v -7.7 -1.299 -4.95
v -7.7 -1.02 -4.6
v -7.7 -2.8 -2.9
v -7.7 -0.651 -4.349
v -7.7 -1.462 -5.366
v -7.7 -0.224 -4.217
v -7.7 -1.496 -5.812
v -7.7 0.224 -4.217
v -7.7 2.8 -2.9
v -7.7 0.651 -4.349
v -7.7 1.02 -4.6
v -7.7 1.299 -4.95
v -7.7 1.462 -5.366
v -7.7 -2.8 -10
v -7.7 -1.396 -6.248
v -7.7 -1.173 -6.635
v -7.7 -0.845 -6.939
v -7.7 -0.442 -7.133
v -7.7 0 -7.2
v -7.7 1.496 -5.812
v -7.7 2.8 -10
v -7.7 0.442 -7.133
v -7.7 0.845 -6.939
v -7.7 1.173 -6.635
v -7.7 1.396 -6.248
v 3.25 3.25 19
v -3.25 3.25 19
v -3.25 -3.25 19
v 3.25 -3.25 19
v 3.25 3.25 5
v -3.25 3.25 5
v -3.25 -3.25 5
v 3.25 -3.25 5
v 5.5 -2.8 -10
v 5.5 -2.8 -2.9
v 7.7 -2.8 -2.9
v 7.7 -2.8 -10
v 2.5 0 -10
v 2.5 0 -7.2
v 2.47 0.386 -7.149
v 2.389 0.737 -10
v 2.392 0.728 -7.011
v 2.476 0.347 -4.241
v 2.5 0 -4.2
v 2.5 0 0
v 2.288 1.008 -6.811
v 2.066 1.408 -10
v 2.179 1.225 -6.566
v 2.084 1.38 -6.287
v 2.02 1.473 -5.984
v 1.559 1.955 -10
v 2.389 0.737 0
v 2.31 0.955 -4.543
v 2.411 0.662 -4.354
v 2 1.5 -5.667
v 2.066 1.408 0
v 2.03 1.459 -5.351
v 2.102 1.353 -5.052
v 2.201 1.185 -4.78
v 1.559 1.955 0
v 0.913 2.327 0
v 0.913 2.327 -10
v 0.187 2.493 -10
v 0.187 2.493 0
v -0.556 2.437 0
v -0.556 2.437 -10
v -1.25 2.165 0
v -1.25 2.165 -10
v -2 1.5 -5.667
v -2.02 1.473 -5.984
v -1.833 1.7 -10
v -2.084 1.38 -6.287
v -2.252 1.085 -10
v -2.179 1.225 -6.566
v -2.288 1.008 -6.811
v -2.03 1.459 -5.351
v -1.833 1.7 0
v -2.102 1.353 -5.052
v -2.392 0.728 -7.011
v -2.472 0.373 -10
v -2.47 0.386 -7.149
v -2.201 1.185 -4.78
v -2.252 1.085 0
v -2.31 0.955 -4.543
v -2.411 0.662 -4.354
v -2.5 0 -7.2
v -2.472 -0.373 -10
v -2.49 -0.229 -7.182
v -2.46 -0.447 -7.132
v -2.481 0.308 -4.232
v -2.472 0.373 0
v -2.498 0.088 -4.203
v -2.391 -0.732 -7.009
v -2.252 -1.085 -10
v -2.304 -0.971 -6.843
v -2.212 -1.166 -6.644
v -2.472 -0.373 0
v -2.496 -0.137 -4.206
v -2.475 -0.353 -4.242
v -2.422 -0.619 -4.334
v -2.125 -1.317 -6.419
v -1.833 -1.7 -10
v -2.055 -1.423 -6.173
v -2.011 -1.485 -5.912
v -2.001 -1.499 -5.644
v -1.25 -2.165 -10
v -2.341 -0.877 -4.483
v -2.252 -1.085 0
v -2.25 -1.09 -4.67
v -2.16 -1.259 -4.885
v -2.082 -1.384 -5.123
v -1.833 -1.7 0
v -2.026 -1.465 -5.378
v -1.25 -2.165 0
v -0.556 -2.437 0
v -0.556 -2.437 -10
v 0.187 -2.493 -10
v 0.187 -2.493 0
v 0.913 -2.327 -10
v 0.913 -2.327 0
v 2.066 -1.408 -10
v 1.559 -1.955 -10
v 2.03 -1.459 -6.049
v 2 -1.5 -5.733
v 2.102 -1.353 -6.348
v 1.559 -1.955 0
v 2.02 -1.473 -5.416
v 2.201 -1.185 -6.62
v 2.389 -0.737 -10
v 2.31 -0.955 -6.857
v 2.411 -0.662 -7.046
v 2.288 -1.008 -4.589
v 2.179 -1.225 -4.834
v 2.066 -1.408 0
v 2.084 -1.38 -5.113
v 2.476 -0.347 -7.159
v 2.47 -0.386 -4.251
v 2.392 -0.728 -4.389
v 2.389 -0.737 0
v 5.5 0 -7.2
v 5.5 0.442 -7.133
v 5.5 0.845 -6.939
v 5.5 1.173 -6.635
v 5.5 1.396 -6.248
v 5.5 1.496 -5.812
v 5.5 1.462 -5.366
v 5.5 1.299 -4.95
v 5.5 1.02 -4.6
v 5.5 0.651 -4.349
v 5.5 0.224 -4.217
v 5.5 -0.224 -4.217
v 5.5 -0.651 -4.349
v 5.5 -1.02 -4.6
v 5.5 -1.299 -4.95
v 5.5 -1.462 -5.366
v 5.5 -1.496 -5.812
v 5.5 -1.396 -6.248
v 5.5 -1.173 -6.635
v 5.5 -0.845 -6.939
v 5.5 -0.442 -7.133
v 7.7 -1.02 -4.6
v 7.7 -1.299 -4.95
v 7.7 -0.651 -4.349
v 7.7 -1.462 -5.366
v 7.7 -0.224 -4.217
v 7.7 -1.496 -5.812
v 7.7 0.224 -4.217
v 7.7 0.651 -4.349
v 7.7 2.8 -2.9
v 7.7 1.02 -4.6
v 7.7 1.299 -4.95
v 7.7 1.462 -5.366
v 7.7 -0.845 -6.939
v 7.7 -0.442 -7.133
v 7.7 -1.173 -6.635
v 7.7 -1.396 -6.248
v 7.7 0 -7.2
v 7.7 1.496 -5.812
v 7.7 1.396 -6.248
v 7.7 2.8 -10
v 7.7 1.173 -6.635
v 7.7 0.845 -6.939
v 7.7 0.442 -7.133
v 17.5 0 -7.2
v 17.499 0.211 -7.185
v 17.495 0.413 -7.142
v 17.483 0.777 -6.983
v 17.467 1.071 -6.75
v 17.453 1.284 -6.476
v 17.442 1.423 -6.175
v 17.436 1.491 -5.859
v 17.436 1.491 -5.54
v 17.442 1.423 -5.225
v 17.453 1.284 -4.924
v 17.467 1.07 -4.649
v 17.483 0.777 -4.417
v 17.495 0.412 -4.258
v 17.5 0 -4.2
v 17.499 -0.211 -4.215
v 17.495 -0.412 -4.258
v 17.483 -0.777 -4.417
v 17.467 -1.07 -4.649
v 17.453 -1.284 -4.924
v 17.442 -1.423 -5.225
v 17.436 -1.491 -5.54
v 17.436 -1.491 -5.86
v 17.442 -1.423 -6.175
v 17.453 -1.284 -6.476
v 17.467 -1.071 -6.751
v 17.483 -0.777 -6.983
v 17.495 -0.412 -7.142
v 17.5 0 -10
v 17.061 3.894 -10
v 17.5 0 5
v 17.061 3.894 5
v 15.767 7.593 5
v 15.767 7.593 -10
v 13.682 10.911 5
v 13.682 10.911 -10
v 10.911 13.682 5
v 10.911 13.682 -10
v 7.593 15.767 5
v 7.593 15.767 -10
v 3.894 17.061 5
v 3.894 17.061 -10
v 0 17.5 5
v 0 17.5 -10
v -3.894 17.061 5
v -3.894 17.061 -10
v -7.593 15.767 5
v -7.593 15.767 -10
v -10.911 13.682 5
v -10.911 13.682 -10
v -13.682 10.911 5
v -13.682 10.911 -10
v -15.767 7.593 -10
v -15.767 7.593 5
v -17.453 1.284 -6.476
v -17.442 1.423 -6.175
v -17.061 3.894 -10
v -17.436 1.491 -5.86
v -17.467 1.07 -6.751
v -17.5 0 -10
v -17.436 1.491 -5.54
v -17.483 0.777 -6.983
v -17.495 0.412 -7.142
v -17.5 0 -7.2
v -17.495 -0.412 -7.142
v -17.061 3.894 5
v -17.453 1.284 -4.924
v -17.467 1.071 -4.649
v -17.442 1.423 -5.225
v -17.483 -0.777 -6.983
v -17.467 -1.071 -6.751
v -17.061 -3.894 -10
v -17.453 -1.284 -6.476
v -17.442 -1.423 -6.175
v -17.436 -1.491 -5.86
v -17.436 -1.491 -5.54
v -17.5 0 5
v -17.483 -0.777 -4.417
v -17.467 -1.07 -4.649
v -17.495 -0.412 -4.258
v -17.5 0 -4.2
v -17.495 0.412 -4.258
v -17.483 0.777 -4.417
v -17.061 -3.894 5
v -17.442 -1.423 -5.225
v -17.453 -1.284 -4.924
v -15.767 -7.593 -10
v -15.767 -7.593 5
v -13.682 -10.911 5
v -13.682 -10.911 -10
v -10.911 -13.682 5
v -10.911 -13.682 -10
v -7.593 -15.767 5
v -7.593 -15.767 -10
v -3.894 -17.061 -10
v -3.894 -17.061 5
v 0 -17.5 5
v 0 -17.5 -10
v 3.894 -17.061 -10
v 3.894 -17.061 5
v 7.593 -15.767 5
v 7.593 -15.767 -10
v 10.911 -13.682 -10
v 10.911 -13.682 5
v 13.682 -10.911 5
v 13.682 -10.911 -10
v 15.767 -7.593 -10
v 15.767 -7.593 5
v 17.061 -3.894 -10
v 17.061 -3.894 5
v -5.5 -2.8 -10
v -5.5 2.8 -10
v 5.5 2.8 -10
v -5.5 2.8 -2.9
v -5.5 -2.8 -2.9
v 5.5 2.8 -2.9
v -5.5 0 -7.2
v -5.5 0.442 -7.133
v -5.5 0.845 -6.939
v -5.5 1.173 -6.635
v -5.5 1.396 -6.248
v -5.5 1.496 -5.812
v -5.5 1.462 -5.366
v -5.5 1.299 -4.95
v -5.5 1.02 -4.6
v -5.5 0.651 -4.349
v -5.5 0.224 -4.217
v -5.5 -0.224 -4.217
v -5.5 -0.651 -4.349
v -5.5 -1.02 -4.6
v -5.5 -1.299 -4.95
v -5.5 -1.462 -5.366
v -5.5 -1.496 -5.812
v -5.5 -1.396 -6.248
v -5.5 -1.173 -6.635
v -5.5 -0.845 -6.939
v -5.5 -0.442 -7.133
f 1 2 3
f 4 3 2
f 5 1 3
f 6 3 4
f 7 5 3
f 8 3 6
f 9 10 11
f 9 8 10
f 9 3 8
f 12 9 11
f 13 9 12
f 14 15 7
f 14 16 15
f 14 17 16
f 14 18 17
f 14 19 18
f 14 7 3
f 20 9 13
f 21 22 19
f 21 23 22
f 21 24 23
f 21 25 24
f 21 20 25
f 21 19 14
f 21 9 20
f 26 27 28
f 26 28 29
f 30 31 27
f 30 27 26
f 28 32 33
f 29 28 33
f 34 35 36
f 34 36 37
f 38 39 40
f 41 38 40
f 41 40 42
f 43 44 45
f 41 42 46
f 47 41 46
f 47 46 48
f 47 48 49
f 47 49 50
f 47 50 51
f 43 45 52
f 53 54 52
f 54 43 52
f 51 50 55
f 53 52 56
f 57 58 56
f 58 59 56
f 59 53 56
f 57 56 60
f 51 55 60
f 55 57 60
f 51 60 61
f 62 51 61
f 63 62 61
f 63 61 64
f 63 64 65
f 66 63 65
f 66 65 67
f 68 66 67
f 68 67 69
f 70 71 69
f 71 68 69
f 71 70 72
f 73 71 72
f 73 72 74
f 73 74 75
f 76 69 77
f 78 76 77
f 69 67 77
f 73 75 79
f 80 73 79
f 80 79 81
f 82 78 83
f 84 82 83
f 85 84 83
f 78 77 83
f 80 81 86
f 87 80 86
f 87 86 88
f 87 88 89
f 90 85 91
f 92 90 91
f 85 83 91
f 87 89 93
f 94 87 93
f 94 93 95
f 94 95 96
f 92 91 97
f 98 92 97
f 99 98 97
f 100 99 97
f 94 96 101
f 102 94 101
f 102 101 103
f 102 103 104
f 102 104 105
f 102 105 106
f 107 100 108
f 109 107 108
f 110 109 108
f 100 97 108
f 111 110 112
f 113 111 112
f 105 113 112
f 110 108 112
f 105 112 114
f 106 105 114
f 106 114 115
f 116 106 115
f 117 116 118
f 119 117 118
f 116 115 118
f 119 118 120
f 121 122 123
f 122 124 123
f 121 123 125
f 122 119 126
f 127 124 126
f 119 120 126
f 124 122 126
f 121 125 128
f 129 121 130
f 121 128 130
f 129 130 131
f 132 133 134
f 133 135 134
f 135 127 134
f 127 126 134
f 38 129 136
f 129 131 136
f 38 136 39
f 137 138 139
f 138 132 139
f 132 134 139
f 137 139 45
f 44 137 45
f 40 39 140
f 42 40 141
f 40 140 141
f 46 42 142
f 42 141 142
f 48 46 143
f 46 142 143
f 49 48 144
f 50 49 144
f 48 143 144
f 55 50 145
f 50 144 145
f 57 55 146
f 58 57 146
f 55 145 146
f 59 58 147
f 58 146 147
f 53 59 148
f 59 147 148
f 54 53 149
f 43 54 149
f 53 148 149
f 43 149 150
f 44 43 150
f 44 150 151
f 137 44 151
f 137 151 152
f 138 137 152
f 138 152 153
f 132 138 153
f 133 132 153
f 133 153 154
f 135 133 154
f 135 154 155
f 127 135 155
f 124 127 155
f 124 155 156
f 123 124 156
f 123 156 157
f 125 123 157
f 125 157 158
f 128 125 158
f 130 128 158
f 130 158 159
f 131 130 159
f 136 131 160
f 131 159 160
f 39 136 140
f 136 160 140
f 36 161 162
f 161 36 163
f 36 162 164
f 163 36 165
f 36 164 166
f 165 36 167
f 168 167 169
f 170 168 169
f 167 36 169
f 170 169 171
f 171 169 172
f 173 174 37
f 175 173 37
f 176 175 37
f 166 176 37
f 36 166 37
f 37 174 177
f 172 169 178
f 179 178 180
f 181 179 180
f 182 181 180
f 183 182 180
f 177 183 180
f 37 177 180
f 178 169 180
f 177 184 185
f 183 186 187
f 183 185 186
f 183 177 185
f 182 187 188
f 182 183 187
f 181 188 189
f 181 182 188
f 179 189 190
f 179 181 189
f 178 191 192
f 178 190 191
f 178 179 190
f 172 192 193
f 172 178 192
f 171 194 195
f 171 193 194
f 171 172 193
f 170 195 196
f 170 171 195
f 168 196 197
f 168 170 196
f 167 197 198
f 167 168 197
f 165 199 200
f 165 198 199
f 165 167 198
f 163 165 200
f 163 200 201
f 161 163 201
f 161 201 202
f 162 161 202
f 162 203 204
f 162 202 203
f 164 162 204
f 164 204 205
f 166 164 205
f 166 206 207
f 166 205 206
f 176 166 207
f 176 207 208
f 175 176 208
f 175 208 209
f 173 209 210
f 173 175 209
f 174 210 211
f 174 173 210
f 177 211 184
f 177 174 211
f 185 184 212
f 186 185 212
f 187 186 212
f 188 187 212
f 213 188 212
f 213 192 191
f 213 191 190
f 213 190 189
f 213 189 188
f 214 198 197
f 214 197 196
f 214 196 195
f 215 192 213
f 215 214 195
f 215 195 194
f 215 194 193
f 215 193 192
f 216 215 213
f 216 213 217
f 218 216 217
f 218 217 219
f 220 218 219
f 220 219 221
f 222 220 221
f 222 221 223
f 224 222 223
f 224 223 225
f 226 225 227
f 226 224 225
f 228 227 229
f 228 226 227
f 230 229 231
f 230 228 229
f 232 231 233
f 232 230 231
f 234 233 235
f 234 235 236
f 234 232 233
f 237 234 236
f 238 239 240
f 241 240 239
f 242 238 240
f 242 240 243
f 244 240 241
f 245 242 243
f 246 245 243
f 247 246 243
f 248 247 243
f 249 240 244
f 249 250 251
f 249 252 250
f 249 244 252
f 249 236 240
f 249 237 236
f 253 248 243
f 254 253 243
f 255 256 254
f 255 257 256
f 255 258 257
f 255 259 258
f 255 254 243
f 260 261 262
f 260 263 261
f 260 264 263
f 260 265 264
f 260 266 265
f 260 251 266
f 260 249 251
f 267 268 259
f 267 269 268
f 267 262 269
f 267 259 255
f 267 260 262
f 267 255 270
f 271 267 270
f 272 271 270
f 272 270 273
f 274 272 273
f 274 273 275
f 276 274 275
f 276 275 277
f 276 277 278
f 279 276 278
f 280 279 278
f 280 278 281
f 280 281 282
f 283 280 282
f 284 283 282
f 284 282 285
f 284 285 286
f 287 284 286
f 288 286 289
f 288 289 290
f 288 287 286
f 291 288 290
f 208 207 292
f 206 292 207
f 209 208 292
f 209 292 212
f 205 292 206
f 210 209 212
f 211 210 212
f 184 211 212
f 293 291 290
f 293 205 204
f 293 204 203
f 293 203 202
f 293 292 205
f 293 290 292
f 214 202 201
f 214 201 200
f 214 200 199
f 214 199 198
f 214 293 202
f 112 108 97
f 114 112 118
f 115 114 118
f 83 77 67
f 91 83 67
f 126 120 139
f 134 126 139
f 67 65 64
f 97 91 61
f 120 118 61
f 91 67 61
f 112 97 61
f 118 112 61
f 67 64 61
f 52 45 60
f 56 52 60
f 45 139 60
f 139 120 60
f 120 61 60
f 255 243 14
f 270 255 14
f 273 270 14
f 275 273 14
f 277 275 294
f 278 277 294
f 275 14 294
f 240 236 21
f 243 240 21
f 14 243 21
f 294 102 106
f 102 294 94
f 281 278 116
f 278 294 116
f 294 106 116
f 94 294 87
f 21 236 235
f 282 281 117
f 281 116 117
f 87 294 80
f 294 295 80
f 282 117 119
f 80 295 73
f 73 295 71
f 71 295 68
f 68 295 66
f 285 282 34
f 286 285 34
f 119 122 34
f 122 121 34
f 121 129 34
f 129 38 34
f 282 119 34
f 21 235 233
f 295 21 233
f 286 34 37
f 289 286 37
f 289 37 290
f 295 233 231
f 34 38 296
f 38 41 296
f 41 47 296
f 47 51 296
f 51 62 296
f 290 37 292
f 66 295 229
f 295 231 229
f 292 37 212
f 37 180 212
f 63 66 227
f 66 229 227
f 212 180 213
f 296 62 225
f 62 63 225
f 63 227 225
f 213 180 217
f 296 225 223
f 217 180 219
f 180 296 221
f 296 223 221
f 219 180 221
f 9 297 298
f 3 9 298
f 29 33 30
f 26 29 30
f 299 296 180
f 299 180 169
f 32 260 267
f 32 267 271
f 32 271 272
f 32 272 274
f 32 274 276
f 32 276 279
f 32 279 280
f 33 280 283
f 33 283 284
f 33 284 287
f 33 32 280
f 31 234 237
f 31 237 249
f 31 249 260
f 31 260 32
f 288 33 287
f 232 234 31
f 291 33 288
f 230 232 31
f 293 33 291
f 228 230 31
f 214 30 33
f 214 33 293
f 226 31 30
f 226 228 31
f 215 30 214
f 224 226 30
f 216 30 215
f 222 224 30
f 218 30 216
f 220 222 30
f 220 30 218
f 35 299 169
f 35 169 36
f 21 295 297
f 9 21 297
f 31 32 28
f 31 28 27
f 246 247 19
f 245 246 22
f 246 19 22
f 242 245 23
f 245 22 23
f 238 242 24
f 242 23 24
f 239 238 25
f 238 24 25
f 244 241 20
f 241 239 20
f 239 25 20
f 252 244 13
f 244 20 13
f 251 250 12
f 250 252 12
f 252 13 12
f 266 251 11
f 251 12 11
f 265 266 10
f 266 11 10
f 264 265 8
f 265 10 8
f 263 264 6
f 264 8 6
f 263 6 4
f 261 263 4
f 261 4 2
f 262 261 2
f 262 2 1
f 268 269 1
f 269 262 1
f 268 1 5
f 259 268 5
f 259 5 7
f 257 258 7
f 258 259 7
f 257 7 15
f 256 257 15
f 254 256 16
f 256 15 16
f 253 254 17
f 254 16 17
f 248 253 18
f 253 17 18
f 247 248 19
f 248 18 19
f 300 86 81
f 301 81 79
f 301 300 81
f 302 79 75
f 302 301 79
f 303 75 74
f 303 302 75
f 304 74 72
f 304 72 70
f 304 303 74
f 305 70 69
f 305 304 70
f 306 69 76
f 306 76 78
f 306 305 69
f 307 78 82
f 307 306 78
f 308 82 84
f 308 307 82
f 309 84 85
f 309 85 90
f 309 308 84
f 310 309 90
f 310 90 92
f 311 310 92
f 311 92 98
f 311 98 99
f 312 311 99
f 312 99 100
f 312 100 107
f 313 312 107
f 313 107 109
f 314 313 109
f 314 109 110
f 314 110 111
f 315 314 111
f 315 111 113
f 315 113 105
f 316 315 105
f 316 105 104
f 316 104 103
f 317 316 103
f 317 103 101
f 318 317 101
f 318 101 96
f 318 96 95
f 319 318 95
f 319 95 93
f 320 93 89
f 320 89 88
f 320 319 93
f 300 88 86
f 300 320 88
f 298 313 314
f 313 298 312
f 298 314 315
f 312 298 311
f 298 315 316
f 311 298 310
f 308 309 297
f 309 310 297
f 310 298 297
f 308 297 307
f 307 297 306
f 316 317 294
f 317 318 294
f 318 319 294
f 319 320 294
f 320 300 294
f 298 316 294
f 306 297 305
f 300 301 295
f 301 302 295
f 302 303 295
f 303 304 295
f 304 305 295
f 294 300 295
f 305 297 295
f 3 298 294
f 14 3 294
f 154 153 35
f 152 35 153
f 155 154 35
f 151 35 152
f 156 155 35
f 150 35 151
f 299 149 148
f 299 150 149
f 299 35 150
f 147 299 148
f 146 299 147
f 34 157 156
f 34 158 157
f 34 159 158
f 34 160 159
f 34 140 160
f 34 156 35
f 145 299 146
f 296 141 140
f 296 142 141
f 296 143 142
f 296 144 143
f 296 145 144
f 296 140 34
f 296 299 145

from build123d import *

# Parameters (mm, degrees)
SKETCH1_R                           = 17.5
SKETCH1_R_2                         = 2.5
BOSS_EXTRUDE1_DEPTH                 = 10
BOSS_EXTRUDE2_START                 = 5
SKETCH1_3_R                         = 17.5
BOSS_EXTRUDE2_DEPTH                 = 5
CUT_EXTRUDE1_REACH                  = 32.582
CUT_EXTRUDE1_END_RADIUS             = 17.5
SKETCH8_R                           = 1.5
CUT_EXTRUDE1_DIRECTION_2_REACH      = 32.582
CUT_EXTRUDE1_DIRECTION_2_END_RADIUS = 2.5
CUT_EXTRUDE2_DEPTH                  = 2.2
SKETCH10_W                          = 6.5
SKETCH10_H                          = 6.5
BOSS_EXTRUDE3_DEPTH                 = 14


with BuildPart() as part:
    # Sketch1 → Boss-Extrude1 (new body)
    with BuildSketch(Plane.XY):
        Circle(SKETCH1_R)
        Circle(SKETCH1_R_2, mode=Mode.SUBTRACT)
    extrude(amount=-BOSS_EXTRUDE1_DEPTH)

    # Sketch1<3> → Boss-Extrude2 (add)
    with BuildSketch(Plane.XY.offset(BOSS_EXTRUDE2_START)):
        Circle(SKETCH1_3_R)
    extrude(amount=-BOSS_EXTRUDE2_DEPTH)

    # Cut-Extrude1: up to this cylinder (the profile starts inside it)
    cut_extrude1_end = Plane(origin=(0, 0, -5.7), z_dir=(0, 0, 1)) * Cylinder(CUT_EXTRUDE1_END_RADIUS, 101.164, mode=Mode.PRIVATE)
    # Sketch8 → Cut-Extrude1 (cut, up to the surface)
    with BuildSketch(Plane(origin=(5.5, 0, 0), x_dir=(0, 0, -1), z_dir=(1, 0, 0)), mode=Mode.PRIVATE) as cut_extrude1_sk1:
        with Locations((5.7, 0)):
            Circle(SKETCH8_R)
    cut_extrude1_tool1 = extrude(cut_extrude1_sk1.sketch, amount=CUT_EXTRUDE1_REACH, mode=Mode.PRIVATE) & cut_extrude1_end
    cut_extrude1 = cut_extrude1_tool1.solids().sort_by_distance((5.5, 0, -5.7))[0]
    add(cut_extrude1, mode=Mode.SUBTRACT)

    # Cut-Extrude1 direction 2: up to this cylinder (the profile starts outside it)
    cut_extrude1_direction_2_end = Plane(origin=(0, 0, -5.7), z_dir=(0, 0, 1)) * Cylinder(CUT_EXTRUDE1_DIRECTION_2_END_RADIUS, 71.164, mode=Mode.PRIVATE)
    # Sketch8 → Cut-Extrude1 direction 2 (cut, up to the surface)
    with BuildSketch(Plane(origin=(5.5, 0, 0), x_dir=(0, 0, -1), z_dir=(1, 0, 0)), mode=Mode.PRIVATE) as cut_extrude1_direction_2_sk1:
        with Locations((5.7, 0)):
            Circle(SKETCH8_R)
    cut_extrude1_direction_2_tool1 = extrude(cut_extrude1_direction_2_sk1.sketch, amount=-CUT_EXTRUDE1_DIRECTION_2_REACH, mode=Mode.PRIVATE) - cut_extrude1_direction_2_end
    cut_extrude1_direction_2 = cut_extrude1_direction_2_tool1.solids().sort_by_distance((5.5, 0, -5.7))[0]
    add(cut_extrude1_direction_2, mode=Mode.SUBTRACT)
    cut_extrude1 = cut_extrude1 + cut_extrude1_direction_2  # both directions under the feature's name, for the pattern or mirror that repeats it

    # Sketch8<4> → Cut-Extrude2 (cut)
    with BuildSketch(Plane(origin=(5.5, 0, 0), x_dir=(0, 0, -1), z_dir=(1, 0, 0))):
        Polygon((8.5, 2.8), (2.9, 2.8), (2.9, -2.8), (8.5, -2.8), (10, -2.8), (10, 2.8), align=None)
    cut_extrude2 = extrude(amount=CUT_EXTRUDE2_DEPTH, mode=Mode.SUBTRACT)

    # Mirror1: Cut-Extrude1, Cut-Extrude2 across plane
    add(cut_extrude1.mirror(Plane(origin=(0, 0, 0), x_dir=(0, 0, 1), z_dir=(1, 0, 0))), mode=Mode.SUBTRACT)
    add(cut_extrude2.mirror(Plane(origin=(0, 0, 0), x_dir=(0, 0, 1), z_dir=(1, 0, 0))), mode=Mode.SUBTRACT)

    # Sketch10 → Boss-Extrude3 (add)
    with BuildSketch(Plane.XY.offset(5)):
        Rectangle(SKETCH10_W, SKETCH10_H)
    extrude(amount=BOSS_EXTRUDE3_DEPTH)


solid = part.part
